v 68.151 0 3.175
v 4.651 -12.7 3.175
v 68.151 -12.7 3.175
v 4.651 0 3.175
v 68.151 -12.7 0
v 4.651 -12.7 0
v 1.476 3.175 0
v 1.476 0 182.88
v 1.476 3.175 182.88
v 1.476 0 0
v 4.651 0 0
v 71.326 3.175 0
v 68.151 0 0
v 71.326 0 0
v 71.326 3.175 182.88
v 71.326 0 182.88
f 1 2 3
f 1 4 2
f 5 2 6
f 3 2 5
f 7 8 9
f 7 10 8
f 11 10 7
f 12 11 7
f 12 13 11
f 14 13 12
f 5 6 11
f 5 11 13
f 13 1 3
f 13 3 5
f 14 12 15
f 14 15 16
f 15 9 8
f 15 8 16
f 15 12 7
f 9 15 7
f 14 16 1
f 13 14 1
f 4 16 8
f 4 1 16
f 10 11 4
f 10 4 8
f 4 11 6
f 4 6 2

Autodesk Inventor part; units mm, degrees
ref_plane "YZ Plane" through (0, 0, 0) normal (1, 0, 0) x (0, 1, 0)
ref_plane "XZ Plane" through (0, 0, 0) normal (0, 1, 0) x (-1, 0, 0)
ref_plane "XY Plane" through (0, 0, 0) normal (0, 0, 1) x (1, 0, 0)
sketch "Sketch1" plane through (0, 0, 0) normal (0, 1, 0) x (-1, 0, 0)
  line L0 (-1.4756, 0) -> (-71.3256, 0)
  line L1 (-71.3256, 0) -> (-71.3256, 165.1)
  line L2 (-71.3256, 165.1) -> (-1.4756, 165.1)
  line L3 (-1.4756, 165.1) -> (-1.4756, 0)
  point P0 (0, 0)
  dimension "d0" = 69.85
  dimension "d1" = 165.1
extrude "Extrusion1" add sketch "Sketch1" along normal blind 3.175
sketch "Sketch3" plane through (0, 0, 0) normal (0, -1, 0) x (1, 0, 0)
  line L0 (71.3256, 165.1) -> (71.3256, 0) construction
  line L1 (71.3256, 0) -> (68.1506, 0) construction
  line L2 (71.3256, 0) -> (1.4756, 0) construction
  line L3 (1.4756, 0) -> (4.6506, 0) construction
  line L4 (68.1506, 0) -> (4.6506, 0)
  line L5 (4.6506, 0) -> (4.6506, 3.175)
  line L6 (4.6506, 3.175) -> (68.1506, 3.175)
  line L7 (68.1506, 3.175) -> (68.1506, 0)
  point P0 (0, 0)
  dimension "d7" = 3.175
  dimension "d8" = 3.175
  dimension "d9" = 63.5
  dimension "d10" = 3.175
extrude "Extrusion3" add sketch "Sketch3" along normal blind 12.7
sketch "Sketch4" plane through (1.4756, 0, 165.1) normal (0, 0, 1) x (1, 0, 0)
  line L0 (69.85, 3.175) -> (0, 3.175) projected
  line L1 (0, 3.175) -> (69.85, 3.175)
  line L2 (69.85, 3.175) -> (69.85, 0)
  line L3 (69.85, 0) -> (0, 0)
  line L4 (0, 0) -> (0, 3.175)
  point P0 (-1.4756, 0)
extrude "Extrusion4" add sketch "Sketch4" along normal blind 17.78
properties part number "False_Bottom_2"
